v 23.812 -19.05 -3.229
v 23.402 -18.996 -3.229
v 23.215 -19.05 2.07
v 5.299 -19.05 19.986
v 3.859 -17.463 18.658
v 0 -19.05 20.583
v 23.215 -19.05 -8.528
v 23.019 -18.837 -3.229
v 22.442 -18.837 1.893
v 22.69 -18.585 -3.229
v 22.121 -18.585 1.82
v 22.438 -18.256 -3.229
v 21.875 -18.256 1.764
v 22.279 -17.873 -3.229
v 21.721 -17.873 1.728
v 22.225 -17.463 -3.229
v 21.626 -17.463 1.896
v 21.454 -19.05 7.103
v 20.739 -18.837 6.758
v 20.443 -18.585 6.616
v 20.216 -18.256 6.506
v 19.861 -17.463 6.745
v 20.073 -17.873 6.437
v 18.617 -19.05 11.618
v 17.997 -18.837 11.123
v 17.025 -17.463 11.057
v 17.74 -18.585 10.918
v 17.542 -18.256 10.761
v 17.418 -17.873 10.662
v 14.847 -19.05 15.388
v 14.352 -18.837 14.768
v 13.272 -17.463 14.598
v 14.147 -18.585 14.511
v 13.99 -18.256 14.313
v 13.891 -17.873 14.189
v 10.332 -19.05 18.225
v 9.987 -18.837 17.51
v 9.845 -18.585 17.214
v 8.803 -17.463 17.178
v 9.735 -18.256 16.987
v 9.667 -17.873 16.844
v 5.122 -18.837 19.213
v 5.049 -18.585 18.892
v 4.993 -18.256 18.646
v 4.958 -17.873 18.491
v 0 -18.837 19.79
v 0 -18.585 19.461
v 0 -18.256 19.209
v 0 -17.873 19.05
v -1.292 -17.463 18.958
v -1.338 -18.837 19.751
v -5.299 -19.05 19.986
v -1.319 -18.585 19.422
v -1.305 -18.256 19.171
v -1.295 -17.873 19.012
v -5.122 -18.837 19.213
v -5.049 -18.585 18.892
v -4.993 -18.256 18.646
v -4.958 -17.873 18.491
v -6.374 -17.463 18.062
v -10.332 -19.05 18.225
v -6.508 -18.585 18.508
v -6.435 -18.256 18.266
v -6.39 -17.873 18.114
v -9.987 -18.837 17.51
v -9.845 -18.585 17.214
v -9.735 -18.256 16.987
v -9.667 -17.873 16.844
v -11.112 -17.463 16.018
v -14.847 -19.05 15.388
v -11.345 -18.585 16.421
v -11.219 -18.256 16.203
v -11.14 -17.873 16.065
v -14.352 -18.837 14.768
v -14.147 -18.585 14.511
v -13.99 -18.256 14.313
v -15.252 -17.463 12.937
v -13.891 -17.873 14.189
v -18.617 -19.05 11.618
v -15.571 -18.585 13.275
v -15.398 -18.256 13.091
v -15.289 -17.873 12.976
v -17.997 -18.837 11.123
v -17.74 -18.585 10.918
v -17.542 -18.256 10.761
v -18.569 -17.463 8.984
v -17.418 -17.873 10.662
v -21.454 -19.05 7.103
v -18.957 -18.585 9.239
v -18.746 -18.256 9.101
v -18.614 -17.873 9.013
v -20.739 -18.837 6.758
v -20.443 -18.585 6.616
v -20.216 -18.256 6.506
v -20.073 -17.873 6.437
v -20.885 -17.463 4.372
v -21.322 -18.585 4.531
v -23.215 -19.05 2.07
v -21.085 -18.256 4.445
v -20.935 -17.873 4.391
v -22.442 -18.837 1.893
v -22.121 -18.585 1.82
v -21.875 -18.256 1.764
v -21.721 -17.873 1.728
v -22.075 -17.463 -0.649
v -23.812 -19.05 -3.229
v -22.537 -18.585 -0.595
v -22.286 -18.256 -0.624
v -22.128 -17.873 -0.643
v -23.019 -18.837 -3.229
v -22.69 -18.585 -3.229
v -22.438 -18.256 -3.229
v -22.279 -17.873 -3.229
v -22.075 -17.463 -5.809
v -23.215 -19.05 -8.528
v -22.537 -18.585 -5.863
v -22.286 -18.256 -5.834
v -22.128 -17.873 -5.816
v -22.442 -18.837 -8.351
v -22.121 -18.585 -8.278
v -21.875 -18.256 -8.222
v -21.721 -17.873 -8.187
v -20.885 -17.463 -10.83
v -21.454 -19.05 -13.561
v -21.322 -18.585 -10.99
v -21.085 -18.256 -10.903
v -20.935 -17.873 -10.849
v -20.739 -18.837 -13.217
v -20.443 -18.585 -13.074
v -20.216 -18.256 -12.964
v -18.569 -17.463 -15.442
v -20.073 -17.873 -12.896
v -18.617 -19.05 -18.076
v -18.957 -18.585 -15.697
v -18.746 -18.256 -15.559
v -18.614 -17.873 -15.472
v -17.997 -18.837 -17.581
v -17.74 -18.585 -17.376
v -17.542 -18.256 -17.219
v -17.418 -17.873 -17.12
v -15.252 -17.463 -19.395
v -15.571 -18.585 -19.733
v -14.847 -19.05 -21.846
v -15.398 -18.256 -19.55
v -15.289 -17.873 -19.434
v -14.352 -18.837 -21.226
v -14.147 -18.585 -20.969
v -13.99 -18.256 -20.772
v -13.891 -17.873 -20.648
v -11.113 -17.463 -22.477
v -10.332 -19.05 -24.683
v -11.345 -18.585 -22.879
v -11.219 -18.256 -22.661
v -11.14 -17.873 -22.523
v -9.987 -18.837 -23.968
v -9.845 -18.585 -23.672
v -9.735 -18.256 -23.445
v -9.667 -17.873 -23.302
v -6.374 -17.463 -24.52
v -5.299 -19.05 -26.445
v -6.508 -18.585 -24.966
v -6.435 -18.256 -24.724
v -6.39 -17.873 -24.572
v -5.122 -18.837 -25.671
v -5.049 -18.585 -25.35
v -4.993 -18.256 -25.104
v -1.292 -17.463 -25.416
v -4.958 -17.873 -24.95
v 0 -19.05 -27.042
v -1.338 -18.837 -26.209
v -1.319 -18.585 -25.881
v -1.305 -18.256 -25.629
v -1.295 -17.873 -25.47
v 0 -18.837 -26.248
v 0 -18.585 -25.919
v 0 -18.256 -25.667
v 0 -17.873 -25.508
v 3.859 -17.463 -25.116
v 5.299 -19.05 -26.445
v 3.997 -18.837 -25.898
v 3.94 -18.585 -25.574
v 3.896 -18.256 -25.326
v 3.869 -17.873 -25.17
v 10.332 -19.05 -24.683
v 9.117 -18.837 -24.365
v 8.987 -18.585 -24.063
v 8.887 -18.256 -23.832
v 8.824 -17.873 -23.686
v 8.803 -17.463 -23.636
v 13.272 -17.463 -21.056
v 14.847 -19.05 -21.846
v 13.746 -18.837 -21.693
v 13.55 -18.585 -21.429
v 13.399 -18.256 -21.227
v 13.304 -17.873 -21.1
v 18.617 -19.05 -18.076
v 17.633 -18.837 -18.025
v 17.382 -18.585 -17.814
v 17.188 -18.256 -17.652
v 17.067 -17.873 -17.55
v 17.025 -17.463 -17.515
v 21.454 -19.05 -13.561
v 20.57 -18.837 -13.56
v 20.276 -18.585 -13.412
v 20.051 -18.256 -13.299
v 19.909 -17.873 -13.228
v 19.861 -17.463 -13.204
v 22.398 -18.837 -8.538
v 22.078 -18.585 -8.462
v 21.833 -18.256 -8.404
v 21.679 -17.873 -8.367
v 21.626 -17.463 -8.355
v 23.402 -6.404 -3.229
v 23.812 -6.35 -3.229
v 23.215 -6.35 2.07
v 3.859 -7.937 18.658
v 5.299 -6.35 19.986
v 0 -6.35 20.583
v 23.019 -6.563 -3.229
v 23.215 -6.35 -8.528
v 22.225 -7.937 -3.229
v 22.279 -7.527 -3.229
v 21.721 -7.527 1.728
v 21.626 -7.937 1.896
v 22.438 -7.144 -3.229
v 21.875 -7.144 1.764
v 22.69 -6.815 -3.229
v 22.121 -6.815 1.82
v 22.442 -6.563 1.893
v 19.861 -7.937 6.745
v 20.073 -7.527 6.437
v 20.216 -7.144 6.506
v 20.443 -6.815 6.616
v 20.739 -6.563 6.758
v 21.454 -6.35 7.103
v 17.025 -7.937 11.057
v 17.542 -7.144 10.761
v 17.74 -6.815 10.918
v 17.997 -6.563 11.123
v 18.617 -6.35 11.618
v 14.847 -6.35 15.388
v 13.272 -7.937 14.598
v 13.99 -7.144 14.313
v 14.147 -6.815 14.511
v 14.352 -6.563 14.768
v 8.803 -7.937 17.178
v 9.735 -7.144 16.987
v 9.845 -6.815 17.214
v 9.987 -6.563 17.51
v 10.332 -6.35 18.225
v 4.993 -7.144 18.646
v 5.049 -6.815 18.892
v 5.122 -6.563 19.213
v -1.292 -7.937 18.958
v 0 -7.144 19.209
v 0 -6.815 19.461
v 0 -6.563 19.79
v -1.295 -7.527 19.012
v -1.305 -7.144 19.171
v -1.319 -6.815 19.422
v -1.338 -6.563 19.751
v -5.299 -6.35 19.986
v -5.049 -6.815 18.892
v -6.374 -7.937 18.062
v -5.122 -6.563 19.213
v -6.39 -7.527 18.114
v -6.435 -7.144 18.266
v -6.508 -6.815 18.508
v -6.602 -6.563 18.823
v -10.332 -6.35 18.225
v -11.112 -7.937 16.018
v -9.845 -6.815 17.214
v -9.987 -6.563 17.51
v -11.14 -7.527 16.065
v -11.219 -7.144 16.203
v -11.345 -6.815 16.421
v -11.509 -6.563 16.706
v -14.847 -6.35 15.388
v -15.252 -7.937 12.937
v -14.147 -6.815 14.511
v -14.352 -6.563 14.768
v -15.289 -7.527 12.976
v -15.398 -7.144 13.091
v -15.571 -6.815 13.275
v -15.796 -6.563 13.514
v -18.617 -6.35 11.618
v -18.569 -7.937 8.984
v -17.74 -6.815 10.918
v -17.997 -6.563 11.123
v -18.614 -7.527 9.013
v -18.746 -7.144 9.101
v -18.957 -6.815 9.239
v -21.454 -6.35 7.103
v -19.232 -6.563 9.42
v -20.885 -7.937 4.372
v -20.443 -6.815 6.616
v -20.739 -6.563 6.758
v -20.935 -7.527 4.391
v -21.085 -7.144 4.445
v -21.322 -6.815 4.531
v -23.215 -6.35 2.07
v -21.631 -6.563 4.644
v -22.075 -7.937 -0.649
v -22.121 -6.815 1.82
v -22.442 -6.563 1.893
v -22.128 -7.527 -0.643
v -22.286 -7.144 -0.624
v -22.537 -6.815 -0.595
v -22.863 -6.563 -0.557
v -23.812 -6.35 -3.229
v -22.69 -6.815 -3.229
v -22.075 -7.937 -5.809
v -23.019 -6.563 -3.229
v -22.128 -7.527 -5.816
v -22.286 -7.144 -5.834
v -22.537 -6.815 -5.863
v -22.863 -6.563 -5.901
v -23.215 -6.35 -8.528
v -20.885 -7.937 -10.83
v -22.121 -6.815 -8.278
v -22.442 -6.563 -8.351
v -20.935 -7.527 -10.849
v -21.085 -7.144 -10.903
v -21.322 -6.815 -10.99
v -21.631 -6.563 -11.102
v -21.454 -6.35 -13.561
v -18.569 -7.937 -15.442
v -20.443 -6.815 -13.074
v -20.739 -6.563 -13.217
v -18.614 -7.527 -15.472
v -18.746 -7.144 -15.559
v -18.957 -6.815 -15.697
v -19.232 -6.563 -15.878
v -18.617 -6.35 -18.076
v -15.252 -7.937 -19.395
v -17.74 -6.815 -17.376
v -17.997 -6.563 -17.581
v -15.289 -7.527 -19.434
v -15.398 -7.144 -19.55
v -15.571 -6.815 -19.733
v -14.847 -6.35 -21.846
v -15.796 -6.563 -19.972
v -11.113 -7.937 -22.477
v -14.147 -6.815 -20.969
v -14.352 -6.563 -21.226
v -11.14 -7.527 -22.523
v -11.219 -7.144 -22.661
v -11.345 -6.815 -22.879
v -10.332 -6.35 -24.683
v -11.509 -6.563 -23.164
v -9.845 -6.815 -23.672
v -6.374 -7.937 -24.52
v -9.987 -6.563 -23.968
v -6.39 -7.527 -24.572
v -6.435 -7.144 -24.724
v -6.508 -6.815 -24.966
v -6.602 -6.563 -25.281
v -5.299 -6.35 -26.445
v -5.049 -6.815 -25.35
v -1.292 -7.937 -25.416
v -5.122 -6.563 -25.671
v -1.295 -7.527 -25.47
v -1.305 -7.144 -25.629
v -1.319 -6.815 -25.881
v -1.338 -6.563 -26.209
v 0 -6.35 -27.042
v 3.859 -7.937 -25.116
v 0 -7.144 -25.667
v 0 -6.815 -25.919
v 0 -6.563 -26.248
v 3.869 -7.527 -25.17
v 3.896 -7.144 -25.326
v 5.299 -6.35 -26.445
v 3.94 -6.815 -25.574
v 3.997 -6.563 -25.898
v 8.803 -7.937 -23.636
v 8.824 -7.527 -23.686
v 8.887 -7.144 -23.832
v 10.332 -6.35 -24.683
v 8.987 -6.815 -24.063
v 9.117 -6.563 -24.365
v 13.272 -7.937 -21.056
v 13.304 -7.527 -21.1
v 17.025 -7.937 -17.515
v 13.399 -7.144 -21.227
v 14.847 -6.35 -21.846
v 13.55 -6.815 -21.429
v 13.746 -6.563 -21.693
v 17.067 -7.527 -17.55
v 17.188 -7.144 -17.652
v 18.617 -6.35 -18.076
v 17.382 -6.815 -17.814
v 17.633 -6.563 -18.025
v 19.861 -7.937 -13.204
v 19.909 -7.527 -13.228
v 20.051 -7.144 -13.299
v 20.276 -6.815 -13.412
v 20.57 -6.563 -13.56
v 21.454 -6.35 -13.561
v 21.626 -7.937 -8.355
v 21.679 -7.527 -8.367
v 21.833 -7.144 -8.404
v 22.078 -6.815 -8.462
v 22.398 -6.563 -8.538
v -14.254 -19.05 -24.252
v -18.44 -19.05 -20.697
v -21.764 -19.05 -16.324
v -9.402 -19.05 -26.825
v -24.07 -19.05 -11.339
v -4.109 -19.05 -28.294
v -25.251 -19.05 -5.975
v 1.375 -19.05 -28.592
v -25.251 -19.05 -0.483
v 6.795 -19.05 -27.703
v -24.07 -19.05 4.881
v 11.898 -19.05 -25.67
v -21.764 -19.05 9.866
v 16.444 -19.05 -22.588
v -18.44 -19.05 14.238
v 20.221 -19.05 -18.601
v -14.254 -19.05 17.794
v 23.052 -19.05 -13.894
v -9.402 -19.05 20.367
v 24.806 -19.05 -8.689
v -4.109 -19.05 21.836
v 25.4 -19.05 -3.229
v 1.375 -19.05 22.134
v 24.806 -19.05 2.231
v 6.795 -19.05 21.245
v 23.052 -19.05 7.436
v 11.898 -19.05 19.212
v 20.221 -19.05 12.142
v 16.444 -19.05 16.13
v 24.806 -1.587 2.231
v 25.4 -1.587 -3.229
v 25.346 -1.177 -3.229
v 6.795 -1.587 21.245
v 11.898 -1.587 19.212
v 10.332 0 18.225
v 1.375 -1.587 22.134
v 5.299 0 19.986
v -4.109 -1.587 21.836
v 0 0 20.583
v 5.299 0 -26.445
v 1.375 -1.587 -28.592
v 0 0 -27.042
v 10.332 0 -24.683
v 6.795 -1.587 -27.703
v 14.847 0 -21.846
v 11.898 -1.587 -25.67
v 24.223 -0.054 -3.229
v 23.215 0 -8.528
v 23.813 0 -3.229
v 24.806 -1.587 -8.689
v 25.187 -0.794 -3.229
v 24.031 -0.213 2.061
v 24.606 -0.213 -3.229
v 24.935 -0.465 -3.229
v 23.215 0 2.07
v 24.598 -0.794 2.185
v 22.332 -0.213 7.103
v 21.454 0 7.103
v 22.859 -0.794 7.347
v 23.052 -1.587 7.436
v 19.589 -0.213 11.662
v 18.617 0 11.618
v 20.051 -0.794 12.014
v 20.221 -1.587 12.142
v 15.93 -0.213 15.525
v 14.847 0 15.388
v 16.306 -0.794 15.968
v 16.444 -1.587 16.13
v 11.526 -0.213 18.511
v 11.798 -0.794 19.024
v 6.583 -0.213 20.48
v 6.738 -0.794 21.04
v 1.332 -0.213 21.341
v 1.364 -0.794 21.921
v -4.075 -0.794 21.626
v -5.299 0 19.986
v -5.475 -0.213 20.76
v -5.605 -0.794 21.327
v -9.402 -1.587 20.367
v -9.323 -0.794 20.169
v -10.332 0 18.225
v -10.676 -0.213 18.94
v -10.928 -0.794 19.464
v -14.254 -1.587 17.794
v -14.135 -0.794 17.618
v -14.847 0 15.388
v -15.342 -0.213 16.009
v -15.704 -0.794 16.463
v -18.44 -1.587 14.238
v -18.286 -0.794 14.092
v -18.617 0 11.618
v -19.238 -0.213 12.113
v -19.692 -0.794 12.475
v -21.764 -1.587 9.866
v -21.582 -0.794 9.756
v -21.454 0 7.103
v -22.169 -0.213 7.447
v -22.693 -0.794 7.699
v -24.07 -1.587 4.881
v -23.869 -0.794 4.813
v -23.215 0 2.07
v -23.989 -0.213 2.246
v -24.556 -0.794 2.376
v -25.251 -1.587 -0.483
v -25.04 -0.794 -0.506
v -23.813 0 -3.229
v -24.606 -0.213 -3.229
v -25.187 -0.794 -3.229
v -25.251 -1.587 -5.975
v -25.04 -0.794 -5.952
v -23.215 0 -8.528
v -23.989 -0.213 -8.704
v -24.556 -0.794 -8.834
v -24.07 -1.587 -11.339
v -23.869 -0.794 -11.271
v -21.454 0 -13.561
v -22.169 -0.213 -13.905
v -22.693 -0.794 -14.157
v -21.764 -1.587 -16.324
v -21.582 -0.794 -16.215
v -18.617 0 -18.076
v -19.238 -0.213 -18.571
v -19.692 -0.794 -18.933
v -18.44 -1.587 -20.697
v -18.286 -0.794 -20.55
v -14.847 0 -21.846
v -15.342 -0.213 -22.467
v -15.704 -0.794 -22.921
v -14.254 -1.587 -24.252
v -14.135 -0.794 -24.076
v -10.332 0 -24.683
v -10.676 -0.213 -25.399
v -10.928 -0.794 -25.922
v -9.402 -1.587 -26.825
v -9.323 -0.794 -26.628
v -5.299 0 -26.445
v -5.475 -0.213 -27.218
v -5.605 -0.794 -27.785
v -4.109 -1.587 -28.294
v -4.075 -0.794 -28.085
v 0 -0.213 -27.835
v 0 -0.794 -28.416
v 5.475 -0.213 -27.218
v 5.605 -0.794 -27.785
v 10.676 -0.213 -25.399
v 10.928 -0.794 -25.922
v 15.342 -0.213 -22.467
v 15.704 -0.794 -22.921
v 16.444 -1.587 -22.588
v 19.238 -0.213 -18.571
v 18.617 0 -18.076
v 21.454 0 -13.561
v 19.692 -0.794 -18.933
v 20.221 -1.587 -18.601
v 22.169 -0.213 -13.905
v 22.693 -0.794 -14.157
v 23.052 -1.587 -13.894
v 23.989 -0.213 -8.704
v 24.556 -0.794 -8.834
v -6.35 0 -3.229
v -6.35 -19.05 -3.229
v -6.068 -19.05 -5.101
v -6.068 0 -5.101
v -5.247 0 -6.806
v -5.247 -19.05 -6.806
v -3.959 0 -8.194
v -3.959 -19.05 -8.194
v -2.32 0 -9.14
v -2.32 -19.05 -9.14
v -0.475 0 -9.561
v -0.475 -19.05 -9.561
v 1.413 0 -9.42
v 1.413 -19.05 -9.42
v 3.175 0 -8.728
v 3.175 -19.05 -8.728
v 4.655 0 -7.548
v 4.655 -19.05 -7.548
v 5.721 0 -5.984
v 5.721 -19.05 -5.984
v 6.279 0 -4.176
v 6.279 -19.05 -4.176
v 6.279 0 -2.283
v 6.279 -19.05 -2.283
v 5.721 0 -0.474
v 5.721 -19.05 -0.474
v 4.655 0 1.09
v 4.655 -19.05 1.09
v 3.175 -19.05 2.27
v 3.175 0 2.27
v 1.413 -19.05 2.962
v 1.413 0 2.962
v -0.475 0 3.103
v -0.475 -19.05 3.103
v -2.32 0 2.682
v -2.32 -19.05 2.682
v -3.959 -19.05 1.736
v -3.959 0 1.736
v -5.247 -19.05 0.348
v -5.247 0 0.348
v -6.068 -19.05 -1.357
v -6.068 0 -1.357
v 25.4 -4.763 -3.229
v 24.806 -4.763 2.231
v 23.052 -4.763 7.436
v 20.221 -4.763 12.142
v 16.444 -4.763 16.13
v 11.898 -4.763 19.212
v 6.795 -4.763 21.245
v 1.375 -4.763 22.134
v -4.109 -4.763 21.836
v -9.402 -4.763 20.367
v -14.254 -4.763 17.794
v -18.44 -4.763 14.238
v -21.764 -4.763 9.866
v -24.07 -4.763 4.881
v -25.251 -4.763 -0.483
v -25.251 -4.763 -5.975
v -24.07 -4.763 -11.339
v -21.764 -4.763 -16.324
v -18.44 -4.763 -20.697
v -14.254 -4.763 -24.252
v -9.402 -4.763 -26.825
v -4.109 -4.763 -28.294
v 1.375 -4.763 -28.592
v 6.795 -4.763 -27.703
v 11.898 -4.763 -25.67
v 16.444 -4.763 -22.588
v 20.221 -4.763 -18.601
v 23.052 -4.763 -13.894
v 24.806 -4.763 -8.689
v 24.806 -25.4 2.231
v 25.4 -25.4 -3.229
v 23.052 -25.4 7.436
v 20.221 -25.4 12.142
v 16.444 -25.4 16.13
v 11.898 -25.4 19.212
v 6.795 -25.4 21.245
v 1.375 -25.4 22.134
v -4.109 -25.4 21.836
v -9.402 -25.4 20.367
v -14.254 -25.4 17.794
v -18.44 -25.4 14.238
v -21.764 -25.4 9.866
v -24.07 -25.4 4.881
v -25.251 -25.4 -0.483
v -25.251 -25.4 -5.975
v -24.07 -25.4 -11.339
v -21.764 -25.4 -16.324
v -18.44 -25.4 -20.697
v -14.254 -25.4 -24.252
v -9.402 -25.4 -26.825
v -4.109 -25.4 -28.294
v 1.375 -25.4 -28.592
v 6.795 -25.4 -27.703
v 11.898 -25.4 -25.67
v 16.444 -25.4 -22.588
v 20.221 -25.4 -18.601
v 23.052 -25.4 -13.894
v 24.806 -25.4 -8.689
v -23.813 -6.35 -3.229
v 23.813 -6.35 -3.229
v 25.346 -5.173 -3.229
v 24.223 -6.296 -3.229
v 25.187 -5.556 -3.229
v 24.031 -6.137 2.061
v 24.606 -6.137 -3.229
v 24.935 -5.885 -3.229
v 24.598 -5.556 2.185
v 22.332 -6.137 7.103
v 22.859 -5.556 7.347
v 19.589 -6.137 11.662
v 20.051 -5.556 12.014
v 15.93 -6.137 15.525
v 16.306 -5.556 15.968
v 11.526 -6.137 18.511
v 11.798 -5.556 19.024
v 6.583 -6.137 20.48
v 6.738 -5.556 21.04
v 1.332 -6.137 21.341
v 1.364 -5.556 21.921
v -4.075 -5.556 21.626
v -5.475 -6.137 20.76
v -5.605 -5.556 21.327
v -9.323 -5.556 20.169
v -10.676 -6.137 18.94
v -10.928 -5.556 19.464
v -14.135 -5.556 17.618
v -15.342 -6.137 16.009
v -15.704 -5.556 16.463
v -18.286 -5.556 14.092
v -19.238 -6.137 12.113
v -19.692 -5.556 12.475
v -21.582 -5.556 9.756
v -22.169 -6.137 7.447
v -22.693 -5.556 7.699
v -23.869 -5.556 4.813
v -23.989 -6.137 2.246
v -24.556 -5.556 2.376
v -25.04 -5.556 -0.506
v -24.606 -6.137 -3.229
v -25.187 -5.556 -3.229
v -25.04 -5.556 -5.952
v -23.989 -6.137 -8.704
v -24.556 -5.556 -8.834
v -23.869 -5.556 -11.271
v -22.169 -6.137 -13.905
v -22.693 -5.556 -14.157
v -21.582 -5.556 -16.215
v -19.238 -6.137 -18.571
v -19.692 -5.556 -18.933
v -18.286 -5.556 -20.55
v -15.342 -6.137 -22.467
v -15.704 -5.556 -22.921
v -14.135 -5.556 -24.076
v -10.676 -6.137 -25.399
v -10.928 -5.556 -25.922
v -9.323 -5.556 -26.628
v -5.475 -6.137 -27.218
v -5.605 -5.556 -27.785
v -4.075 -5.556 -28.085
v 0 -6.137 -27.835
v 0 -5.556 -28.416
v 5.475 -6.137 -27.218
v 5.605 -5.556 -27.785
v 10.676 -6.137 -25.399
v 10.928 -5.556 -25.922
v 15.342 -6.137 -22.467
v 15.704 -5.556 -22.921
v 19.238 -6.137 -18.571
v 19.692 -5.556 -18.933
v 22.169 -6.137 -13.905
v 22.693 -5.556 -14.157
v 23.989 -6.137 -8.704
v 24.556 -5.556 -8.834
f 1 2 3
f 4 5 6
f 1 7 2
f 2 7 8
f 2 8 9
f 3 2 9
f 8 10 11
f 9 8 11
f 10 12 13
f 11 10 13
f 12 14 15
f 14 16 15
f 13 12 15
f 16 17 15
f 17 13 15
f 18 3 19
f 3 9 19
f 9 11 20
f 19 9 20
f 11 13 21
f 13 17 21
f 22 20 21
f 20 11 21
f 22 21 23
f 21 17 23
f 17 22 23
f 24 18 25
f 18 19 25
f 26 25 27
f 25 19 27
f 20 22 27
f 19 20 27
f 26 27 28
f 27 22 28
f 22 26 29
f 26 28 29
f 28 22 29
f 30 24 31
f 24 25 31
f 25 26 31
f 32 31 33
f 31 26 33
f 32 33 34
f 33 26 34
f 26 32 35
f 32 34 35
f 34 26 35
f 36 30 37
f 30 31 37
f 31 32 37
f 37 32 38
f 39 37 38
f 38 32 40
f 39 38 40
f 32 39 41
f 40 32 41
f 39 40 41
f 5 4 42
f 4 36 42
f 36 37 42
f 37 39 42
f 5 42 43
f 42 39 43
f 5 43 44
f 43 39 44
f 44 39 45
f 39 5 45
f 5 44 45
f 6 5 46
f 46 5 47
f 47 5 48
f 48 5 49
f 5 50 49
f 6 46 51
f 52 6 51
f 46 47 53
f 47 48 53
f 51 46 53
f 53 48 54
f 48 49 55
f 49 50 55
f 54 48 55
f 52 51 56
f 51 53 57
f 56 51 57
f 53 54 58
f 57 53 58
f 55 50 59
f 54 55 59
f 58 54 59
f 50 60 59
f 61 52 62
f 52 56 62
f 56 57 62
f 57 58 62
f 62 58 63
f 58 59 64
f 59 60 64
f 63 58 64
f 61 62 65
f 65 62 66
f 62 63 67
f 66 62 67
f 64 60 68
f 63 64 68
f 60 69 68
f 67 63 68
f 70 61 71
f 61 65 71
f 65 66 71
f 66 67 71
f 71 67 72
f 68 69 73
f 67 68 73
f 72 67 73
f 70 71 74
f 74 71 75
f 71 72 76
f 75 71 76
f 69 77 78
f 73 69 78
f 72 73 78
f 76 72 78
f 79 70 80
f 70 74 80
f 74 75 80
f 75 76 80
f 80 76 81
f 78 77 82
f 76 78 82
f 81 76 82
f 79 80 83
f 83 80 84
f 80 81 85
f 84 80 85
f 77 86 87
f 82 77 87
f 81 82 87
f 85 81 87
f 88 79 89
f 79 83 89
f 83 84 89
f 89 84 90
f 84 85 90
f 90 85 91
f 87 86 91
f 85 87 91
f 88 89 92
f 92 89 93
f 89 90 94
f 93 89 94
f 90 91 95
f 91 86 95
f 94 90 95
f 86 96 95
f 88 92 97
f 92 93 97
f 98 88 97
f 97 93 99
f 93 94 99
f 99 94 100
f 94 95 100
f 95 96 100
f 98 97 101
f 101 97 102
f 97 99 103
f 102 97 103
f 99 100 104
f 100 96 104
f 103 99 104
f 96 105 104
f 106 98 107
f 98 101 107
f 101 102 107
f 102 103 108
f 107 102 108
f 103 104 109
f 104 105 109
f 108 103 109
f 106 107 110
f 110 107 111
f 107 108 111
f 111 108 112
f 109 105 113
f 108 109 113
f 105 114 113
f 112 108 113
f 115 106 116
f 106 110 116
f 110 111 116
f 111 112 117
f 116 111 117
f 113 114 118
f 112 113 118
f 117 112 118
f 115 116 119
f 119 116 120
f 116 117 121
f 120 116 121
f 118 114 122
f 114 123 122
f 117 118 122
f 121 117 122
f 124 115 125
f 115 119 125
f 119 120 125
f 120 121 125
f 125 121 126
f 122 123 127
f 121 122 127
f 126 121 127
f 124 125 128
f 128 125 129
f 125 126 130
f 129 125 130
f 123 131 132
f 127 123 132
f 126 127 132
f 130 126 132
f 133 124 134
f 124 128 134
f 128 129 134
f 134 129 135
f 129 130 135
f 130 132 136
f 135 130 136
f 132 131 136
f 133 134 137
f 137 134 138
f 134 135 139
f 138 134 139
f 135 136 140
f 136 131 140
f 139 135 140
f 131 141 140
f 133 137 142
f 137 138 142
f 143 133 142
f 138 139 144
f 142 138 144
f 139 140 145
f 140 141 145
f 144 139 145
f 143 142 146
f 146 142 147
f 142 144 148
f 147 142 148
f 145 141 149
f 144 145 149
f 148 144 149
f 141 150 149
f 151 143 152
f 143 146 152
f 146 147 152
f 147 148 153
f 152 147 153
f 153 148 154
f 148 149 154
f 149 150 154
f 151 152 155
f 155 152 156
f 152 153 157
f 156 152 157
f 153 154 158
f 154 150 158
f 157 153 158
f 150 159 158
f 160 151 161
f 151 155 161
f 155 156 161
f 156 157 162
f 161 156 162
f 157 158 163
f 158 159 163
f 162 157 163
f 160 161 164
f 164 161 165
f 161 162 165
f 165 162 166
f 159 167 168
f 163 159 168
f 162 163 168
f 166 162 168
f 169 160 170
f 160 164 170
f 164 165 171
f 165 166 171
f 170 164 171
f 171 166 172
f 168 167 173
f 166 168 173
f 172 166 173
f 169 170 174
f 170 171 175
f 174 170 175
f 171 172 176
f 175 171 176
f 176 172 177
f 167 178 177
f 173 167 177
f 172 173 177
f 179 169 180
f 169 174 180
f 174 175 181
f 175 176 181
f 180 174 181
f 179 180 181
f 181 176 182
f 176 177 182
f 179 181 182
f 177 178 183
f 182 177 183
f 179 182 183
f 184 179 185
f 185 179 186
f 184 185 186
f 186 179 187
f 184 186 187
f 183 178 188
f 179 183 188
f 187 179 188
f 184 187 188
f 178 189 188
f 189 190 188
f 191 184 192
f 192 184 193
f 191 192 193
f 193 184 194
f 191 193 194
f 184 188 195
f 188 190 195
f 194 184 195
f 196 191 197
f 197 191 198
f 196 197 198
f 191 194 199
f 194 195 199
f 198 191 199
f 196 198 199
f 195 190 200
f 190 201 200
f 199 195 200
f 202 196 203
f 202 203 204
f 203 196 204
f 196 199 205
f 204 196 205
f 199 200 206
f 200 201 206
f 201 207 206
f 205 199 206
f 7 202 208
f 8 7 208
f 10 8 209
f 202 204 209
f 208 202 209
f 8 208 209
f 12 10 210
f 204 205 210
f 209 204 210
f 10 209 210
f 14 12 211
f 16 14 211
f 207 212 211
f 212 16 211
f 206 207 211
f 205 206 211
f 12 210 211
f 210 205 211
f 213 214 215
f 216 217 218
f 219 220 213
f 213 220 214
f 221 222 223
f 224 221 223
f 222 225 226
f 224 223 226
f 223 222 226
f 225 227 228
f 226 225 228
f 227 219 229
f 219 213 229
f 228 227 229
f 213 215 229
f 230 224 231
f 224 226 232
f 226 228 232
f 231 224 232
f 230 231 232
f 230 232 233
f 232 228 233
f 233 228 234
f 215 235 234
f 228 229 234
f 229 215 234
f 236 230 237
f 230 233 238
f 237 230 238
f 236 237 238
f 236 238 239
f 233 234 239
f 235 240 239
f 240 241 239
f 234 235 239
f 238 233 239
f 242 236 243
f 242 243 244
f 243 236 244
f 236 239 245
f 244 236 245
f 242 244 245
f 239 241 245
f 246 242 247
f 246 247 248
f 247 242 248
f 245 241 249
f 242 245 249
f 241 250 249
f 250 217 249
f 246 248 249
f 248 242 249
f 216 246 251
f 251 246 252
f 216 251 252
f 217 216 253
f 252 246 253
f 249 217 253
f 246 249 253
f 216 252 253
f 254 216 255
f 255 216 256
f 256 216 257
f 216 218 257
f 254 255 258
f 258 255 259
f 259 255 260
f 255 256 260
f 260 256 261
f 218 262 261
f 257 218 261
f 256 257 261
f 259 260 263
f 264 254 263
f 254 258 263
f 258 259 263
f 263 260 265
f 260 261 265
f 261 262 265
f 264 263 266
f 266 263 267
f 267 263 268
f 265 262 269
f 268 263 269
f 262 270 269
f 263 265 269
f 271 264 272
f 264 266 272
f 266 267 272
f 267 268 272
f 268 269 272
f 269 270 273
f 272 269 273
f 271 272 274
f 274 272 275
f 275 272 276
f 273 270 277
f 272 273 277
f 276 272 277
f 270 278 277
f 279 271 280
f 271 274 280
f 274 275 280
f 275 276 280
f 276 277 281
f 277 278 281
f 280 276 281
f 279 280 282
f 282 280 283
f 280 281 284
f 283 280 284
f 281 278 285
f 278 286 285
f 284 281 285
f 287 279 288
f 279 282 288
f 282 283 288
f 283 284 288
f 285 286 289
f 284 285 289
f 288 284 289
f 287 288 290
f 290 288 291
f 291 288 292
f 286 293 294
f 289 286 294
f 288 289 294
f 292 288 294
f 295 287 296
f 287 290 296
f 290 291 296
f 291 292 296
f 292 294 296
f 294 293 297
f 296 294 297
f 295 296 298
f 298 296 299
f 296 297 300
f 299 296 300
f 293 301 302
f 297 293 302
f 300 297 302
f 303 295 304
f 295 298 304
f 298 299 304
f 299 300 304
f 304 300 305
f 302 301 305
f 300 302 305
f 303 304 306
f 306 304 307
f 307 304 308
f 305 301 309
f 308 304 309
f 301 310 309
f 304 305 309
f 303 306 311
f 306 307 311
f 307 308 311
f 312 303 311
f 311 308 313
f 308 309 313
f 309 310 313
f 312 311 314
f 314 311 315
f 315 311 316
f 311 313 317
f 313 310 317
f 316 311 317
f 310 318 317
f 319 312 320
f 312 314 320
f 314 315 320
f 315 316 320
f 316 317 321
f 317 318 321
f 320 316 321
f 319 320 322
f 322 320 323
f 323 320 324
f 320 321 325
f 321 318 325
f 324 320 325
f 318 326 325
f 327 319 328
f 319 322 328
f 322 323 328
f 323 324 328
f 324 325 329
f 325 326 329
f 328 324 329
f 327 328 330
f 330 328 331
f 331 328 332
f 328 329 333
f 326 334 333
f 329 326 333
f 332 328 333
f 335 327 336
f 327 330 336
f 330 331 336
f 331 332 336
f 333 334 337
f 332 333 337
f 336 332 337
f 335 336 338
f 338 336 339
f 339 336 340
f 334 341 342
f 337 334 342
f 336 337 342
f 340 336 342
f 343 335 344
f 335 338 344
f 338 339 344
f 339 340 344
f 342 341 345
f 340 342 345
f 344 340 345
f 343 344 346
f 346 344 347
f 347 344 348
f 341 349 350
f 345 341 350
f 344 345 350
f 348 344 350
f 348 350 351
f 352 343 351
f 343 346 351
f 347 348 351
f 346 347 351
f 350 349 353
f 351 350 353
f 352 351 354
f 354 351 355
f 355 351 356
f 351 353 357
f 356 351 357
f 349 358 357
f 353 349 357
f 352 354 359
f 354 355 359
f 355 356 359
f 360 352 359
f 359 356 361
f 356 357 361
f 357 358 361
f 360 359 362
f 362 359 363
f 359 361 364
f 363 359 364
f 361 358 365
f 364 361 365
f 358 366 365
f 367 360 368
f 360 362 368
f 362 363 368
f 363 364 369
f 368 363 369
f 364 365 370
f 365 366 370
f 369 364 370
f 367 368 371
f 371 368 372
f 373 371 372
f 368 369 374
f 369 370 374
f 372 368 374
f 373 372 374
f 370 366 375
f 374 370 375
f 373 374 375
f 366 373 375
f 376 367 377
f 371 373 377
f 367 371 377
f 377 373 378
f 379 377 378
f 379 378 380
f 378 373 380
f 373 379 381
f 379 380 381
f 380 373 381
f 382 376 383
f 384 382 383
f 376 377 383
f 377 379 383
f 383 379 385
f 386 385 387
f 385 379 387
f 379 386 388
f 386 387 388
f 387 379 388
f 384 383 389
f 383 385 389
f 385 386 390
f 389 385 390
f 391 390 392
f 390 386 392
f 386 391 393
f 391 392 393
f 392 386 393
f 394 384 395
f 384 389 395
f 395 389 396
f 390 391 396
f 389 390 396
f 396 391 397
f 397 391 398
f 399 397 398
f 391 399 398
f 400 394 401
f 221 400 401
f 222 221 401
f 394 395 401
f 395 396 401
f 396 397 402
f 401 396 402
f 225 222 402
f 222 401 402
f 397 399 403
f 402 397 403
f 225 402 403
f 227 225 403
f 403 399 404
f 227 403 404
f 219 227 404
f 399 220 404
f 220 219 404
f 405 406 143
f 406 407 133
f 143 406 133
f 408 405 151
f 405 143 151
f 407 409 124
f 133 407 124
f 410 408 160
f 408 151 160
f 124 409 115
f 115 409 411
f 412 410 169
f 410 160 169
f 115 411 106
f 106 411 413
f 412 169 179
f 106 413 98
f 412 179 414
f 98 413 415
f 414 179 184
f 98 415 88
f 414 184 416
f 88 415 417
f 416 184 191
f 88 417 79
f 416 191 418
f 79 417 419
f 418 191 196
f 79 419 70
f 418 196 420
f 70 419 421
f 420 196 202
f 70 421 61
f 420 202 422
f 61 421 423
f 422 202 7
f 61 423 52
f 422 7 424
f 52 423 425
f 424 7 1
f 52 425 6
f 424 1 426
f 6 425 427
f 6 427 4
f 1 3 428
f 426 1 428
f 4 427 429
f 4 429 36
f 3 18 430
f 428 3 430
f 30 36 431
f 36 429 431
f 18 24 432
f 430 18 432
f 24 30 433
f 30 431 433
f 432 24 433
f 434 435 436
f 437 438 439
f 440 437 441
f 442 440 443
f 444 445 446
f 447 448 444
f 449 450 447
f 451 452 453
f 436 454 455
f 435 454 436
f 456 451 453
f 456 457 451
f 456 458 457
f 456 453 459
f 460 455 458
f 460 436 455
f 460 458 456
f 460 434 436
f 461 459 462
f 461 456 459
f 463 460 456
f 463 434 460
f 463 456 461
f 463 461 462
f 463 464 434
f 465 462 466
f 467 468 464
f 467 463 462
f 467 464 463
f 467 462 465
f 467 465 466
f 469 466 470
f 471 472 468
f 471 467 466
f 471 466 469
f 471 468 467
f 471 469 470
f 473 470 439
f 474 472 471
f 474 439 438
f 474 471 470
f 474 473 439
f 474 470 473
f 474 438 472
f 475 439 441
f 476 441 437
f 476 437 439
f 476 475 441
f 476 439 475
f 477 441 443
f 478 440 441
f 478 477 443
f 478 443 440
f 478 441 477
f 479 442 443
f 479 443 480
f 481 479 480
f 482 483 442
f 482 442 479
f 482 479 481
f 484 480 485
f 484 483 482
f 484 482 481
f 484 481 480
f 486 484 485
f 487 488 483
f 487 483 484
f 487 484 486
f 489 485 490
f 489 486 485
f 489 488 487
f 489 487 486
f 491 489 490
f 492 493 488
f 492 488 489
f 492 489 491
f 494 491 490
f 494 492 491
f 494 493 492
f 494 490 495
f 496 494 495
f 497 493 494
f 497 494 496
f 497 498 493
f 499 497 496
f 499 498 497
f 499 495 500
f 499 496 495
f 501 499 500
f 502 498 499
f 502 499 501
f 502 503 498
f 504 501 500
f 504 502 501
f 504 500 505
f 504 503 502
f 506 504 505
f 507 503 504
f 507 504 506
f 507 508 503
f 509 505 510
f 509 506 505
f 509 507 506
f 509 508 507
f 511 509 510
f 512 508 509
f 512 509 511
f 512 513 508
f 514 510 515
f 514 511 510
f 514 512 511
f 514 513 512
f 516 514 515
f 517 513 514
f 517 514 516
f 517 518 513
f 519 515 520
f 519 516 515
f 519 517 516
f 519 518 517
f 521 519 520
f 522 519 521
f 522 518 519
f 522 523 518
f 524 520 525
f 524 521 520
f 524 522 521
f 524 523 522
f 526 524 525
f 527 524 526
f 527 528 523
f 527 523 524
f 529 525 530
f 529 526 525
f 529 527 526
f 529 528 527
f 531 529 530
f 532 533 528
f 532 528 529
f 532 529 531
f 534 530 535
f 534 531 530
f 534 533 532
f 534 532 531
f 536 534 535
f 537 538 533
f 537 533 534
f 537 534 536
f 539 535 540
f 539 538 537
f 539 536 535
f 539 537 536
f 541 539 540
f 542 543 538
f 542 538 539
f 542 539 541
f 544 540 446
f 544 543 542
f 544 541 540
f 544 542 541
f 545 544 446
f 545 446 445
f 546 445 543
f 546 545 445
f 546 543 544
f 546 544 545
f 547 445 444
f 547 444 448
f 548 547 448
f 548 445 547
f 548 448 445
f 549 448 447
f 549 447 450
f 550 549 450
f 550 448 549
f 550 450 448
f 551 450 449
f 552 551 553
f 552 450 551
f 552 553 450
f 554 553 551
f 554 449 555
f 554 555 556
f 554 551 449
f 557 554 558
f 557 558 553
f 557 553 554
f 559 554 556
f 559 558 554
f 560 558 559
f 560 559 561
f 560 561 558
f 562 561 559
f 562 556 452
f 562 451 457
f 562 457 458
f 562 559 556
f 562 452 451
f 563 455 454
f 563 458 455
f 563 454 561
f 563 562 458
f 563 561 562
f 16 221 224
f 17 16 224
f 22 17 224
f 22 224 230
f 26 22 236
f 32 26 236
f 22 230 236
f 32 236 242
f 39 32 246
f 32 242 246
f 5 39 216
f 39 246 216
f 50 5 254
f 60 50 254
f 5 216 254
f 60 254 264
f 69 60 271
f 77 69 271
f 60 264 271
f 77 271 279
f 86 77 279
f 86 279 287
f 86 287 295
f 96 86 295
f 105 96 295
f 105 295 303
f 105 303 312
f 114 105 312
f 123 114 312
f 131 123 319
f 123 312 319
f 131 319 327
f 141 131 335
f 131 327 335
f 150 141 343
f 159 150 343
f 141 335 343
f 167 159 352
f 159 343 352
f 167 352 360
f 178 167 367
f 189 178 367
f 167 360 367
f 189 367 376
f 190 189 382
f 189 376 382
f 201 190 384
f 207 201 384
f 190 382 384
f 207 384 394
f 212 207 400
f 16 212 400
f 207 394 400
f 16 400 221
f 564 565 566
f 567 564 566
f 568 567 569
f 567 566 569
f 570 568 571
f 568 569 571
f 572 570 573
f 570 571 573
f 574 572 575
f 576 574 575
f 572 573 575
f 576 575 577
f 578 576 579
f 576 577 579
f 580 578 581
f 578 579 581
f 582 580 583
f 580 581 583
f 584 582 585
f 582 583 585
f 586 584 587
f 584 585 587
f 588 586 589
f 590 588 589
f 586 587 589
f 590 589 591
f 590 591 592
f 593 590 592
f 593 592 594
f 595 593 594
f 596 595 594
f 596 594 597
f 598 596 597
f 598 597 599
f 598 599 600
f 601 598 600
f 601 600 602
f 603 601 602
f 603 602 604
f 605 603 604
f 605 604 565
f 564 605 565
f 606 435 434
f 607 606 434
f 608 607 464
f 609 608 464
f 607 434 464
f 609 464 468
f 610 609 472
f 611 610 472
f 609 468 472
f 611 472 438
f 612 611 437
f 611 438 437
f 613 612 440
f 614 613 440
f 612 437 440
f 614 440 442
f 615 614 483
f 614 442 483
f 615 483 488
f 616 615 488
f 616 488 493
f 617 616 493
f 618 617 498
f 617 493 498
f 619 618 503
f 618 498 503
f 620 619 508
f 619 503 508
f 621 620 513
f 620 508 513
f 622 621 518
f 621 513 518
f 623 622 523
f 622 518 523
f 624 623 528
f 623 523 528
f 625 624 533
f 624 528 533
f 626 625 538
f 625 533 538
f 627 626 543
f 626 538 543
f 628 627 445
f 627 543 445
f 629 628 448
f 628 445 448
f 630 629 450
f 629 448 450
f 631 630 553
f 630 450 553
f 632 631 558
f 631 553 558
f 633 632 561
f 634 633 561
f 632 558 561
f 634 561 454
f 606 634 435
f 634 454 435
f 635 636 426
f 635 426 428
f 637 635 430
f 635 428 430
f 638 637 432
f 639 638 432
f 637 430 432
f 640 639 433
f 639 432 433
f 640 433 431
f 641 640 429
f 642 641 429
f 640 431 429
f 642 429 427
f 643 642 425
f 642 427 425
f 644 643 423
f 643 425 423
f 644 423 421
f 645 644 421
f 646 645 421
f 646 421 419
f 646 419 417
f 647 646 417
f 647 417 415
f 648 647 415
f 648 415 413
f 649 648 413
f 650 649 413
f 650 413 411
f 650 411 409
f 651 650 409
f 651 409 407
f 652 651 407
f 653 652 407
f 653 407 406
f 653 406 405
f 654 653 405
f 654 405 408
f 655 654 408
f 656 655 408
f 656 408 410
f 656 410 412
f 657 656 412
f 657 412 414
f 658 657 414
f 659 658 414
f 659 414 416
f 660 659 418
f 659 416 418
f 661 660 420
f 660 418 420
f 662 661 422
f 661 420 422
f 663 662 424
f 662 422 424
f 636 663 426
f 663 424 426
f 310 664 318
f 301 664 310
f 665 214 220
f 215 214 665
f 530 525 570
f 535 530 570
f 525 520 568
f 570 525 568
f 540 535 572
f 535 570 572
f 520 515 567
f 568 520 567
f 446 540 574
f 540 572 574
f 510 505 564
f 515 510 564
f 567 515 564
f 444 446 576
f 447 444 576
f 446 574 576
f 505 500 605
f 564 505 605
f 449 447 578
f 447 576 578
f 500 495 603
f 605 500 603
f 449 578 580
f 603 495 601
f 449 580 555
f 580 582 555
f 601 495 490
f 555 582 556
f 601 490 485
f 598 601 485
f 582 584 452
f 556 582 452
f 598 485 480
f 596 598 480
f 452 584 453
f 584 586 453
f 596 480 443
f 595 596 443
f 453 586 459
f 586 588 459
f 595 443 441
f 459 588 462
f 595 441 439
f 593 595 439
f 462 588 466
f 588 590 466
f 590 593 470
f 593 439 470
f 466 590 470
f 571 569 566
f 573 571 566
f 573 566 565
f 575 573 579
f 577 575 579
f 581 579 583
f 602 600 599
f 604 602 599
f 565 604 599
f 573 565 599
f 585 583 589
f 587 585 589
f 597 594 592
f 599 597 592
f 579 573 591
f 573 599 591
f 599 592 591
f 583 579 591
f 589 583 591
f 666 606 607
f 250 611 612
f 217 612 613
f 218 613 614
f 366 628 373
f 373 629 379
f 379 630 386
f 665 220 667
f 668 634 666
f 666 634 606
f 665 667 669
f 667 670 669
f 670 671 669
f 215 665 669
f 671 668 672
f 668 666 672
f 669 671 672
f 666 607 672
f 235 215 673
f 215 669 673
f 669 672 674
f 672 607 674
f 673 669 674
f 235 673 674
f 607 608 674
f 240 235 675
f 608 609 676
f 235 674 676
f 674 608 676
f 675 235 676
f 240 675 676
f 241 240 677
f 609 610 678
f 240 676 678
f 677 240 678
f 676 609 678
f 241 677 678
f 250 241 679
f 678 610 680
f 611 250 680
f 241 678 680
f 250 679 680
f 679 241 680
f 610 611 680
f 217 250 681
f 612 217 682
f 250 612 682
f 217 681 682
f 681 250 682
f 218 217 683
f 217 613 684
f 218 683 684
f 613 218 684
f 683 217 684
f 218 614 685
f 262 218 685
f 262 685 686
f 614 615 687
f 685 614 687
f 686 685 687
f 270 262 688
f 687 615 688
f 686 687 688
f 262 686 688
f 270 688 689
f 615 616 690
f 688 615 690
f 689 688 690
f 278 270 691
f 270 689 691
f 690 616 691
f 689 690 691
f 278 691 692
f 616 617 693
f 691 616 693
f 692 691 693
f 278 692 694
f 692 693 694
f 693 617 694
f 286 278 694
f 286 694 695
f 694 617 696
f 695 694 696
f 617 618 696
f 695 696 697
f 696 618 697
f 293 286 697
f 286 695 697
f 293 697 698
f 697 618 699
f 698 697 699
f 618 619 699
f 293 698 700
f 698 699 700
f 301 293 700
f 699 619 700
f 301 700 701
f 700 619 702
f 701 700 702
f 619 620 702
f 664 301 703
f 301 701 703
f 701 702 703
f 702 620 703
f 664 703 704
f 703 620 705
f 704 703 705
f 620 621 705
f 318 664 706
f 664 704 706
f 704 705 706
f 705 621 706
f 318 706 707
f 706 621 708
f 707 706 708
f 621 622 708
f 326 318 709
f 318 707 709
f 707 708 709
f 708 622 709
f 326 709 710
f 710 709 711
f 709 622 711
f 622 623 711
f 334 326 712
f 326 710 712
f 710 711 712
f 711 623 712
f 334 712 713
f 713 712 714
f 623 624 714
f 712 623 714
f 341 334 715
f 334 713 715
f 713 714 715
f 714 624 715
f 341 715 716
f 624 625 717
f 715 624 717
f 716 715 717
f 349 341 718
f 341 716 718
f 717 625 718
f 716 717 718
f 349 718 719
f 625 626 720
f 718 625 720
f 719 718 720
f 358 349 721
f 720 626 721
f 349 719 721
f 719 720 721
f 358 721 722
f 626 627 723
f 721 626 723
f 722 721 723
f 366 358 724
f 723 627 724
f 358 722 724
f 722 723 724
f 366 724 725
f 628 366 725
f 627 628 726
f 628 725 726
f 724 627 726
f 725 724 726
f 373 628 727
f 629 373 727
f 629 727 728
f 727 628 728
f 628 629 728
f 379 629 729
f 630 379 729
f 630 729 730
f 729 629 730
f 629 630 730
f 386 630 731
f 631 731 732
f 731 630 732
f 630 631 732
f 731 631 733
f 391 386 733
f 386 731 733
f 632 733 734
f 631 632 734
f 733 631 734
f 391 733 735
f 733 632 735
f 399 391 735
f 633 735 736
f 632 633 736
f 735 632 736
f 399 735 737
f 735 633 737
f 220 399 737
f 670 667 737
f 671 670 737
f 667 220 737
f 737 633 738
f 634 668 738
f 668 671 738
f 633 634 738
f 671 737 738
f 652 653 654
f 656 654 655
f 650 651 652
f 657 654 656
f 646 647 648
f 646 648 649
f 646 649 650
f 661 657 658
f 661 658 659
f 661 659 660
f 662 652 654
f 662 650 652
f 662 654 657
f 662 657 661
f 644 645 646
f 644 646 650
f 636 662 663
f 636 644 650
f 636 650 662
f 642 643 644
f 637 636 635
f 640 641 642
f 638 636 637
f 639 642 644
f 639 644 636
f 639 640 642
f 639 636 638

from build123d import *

# Parameters (mm, degrees)
F0_R      = 25.4
F1_DEPTH  = 6.35
F2_R      = 22.225
F3_DEPTH  = 12.7
F4_R      = 25.4
F4_R_2    = 22.225
F5_DEPTH  = 6.35
F7_D      = 3.175
F7_DEPTH  = 3.175
F7_TIP    = 0.9538662327
F8_D      = 12.7
F9_R      = 1.58749
F10_DEPTH = 6.35


# Not quite as in the source:
# - a fillet or chamfer is up to 0.001 mm smaller than in the source, because OpenCascade refuses the exact size


with BuildPart() as f1:
    # F0 (on Front) → F1 (new body)
    with BuildSketch(Plane.XZ):
        with Locations((0, -3.2290907108)):
            Circle(F0_R)
    extrude(amount=F1_DEPTH)

    # F2 (on face) → F3 (join)
    with BuildSketch(Plane.XZ.offset(6.35)):
        with Locations((0, -3.2290907108)):
            Circle(F2_R)
    extrude(amount=F3_DEPTH)

    # F4 (on face) → F5 (join)
    with BuildSketch(Plane.XZ.offset(19.05)):
        with Locations((0, -3.2290907108)):
            Circle(F4_R)
        with Locations((0, -3.2290907108)):
            Circle(F4_R_2, mode=Mode.SUBTRACT)
        with Locations((0, -3.2290907108)):
            Circle(F4_R_2)
    extrude(amount=F5_DEPTH)

    # F7
    with Locations(Plane.XZ.offset(25.4)):
        with Locations((19.05, -3.2290907108), (0, -22.2790907108), (-19.05, -3.2290907108), (0, 15.8209092892)):
            Hole(F7_D / 2, depth=F7_DEPTH)
            with Locations((0, 0, -(F7_DEPTH + F7_TIP / 2))):  # 118° drill point
                Cone(0, F7_D / 2, F7_TIP, mode=Mode.SUBTRACT)

    # F8 (through all)
    with Locations(Plane(origin=(0, 0, 0), x_dir=(1, 0, 0), z_dir=(0, 1, 0))):
        with Locations((0, 3.2290907108)):
            Hole(F8_D / 2)

    # F9 (radius 1.5875 in the source; OpenCascade refuses exactly that, so slightly less here)
    f9_edges = [f1.edges().sort_by_distance(p)[0] for p in [
        (-25.4, -6.35, -3.229091),
        (-25.4, 0, -3.229091),
        (-22.225, -6.35, -3.229091),
        (-25.4, -25.4, -3.229091),
        (-25.4, -19.05, -3.229091),
        (-22.225, -19.05, -3.229091),
    ]]
    fillet(f9_edges, radius=F9_R)

    # F4 (on face) → F10 (join)
    with BuildSketch(Plane.XZ.offset(19.05)):
        with Locations((0, -3.2290907108)):
            Circle(F4_R)
    extrude(amount=F10_DEPTH)


solid = f1.part
